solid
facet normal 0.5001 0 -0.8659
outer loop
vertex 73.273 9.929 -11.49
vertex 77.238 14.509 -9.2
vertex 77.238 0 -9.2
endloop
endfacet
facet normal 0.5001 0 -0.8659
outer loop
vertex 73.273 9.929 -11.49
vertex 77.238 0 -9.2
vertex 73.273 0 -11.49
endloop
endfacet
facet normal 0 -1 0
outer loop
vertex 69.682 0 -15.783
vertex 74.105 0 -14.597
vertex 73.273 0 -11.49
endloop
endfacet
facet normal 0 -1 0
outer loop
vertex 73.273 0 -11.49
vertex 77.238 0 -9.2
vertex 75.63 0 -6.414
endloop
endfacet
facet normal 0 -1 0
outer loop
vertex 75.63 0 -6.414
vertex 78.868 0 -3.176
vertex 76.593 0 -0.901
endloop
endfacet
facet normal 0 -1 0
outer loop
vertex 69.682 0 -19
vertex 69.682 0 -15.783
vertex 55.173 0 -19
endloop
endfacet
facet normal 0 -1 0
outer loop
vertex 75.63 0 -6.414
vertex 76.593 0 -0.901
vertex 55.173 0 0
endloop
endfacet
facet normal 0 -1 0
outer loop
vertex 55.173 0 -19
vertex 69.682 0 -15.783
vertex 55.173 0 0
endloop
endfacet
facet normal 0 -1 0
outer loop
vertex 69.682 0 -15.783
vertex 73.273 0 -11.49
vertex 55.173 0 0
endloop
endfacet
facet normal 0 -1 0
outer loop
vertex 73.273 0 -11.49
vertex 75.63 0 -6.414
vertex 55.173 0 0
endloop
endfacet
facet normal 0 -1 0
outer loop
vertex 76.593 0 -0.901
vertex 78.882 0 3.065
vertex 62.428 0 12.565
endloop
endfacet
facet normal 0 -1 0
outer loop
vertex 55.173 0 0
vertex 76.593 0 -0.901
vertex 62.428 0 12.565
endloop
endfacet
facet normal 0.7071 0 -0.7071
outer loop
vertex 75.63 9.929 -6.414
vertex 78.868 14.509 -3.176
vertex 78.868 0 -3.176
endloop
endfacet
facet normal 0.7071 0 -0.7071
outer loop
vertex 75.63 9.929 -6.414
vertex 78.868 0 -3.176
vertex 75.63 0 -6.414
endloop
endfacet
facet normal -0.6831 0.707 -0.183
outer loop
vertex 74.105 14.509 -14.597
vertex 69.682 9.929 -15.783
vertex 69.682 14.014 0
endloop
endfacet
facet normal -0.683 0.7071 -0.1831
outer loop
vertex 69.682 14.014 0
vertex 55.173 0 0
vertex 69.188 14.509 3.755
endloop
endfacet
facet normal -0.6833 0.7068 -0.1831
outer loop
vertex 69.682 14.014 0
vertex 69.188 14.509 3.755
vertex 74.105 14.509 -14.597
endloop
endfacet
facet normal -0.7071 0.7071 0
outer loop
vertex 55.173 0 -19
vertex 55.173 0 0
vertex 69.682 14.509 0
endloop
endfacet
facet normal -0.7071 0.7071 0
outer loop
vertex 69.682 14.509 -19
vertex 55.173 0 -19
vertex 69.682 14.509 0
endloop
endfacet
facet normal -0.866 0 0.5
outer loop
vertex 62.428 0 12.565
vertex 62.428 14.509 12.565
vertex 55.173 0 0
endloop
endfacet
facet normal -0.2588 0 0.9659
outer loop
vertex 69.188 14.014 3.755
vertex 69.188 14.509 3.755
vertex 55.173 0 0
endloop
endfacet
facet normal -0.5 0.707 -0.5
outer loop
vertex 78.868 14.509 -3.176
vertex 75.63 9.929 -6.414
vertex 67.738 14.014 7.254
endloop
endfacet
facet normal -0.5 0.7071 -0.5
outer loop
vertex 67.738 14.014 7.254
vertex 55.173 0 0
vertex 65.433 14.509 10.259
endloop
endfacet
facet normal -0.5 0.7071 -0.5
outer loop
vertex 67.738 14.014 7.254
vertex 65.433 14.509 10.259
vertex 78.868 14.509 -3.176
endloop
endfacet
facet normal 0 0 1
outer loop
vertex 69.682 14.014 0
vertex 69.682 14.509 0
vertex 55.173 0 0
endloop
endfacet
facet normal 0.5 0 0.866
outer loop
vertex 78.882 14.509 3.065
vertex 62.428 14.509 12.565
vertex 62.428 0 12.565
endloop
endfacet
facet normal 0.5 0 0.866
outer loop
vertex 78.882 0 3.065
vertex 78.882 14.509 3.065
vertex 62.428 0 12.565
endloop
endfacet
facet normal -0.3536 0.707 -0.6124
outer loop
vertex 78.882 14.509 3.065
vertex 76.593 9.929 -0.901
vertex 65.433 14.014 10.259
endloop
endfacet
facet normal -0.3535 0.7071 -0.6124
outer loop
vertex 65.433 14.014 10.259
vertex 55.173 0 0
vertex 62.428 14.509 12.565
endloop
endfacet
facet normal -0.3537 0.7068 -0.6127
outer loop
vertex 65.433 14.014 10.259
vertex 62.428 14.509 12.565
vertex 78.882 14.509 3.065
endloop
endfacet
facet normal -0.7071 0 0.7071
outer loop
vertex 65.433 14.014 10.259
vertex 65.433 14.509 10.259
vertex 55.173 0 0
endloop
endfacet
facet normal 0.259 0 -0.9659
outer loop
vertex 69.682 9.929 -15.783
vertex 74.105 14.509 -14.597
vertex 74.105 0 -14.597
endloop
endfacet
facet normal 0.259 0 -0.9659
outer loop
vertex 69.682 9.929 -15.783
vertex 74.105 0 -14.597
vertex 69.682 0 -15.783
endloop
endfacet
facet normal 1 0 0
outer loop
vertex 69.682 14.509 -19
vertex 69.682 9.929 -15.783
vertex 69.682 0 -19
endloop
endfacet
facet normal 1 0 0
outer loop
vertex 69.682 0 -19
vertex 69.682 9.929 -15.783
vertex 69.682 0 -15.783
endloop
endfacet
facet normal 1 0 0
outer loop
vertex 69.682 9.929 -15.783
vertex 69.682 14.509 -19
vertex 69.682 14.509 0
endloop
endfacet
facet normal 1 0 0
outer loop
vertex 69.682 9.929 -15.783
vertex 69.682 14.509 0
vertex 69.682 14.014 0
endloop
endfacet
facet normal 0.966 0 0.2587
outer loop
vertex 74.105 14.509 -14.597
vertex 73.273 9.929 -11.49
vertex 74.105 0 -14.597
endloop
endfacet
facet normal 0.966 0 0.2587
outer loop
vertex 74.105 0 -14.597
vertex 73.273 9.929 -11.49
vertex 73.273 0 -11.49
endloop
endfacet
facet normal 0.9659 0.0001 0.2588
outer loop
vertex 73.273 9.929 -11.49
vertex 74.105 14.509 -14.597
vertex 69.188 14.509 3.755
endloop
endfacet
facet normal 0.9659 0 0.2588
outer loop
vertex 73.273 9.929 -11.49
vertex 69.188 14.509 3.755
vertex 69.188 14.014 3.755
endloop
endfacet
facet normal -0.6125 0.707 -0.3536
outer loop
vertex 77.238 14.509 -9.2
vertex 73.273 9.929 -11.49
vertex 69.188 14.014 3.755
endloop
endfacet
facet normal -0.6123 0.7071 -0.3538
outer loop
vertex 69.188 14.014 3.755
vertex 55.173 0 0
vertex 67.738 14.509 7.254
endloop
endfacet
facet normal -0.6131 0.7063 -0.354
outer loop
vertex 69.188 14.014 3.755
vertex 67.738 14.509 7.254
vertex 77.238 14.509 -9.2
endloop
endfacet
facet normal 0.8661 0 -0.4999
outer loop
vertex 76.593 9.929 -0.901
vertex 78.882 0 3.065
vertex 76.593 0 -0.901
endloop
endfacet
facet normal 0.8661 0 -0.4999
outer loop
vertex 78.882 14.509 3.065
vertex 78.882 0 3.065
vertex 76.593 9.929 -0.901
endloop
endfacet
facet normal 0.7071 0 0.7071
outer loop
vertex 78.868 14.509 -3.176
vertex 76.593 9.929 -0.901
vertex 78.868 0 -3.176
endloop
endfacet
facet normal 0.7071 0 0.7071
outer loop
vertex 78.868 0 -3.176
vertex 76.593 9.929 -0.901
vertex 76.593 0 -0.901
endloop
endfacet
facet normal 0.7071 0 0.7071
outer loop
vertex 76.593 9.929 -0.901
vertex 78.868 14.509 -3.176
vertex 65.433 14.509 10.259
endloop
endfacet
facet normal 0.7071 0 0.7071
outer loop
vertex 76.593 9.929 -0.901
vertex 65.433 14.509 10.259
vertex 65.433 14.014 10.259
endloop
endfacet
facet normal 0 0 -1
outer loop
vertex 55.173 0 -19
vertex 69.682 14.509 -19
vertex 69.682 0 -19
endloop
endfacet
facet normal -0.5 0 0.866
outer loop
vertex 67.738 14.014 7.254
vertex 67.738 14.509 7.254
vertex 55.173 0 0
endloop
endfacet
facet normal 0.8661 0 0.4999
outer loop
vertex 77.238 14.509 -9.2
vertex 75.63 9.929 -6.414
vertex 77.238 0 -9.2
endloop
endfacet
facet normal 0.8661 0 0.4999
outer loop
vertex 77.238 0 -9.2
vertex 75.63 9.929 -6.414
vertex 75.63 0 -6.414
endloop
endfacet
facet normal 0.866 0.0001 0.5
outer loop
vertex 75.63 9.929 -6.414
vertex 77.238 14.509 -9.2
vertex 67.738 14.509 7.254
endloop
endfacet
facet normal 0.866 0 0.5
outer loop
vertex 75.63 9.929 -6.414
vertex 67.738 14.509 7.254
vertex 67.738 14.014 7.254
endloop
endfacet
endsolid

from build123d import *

# Parameters (mm, degrees)
AUFSATZ_LINEAR_AUSTRAGEN1_DEPTH = 19
KREISMUSTER1_COUNT              = 5
KREISMUSTER1_ANGLE              = 60


with BuildPart() as part:
    # Skizze2 → Aufsatz-Linear austragen1 (new body)
    with BuildSketch(Plane.XY):
        Polygon((55.173482404, 0), (69.682060417, 14.508578013), (69.682060417, 0), align=None)
    aufsatz_linear_austragen1 = extrude(amount=-AUFSATZ_LINEAR_AUSTRAGEN1_DEPTH)

    # Kreismuster1: Aufsatz-Linear austragen1 ×5 about axis
    kreismuster1_axis = Axis((55.173482404, 0, 0), (0, -1, 0))
    for i in range(1, KREISMUSTER1_COUNT):
        add(aufsatz_linear_austragen1.rotate(kreismuster1_axis, i * KREISMUSTER1_ANGLE / (KREISMUSTER1_COUNT - 1)))


solid = part.part
